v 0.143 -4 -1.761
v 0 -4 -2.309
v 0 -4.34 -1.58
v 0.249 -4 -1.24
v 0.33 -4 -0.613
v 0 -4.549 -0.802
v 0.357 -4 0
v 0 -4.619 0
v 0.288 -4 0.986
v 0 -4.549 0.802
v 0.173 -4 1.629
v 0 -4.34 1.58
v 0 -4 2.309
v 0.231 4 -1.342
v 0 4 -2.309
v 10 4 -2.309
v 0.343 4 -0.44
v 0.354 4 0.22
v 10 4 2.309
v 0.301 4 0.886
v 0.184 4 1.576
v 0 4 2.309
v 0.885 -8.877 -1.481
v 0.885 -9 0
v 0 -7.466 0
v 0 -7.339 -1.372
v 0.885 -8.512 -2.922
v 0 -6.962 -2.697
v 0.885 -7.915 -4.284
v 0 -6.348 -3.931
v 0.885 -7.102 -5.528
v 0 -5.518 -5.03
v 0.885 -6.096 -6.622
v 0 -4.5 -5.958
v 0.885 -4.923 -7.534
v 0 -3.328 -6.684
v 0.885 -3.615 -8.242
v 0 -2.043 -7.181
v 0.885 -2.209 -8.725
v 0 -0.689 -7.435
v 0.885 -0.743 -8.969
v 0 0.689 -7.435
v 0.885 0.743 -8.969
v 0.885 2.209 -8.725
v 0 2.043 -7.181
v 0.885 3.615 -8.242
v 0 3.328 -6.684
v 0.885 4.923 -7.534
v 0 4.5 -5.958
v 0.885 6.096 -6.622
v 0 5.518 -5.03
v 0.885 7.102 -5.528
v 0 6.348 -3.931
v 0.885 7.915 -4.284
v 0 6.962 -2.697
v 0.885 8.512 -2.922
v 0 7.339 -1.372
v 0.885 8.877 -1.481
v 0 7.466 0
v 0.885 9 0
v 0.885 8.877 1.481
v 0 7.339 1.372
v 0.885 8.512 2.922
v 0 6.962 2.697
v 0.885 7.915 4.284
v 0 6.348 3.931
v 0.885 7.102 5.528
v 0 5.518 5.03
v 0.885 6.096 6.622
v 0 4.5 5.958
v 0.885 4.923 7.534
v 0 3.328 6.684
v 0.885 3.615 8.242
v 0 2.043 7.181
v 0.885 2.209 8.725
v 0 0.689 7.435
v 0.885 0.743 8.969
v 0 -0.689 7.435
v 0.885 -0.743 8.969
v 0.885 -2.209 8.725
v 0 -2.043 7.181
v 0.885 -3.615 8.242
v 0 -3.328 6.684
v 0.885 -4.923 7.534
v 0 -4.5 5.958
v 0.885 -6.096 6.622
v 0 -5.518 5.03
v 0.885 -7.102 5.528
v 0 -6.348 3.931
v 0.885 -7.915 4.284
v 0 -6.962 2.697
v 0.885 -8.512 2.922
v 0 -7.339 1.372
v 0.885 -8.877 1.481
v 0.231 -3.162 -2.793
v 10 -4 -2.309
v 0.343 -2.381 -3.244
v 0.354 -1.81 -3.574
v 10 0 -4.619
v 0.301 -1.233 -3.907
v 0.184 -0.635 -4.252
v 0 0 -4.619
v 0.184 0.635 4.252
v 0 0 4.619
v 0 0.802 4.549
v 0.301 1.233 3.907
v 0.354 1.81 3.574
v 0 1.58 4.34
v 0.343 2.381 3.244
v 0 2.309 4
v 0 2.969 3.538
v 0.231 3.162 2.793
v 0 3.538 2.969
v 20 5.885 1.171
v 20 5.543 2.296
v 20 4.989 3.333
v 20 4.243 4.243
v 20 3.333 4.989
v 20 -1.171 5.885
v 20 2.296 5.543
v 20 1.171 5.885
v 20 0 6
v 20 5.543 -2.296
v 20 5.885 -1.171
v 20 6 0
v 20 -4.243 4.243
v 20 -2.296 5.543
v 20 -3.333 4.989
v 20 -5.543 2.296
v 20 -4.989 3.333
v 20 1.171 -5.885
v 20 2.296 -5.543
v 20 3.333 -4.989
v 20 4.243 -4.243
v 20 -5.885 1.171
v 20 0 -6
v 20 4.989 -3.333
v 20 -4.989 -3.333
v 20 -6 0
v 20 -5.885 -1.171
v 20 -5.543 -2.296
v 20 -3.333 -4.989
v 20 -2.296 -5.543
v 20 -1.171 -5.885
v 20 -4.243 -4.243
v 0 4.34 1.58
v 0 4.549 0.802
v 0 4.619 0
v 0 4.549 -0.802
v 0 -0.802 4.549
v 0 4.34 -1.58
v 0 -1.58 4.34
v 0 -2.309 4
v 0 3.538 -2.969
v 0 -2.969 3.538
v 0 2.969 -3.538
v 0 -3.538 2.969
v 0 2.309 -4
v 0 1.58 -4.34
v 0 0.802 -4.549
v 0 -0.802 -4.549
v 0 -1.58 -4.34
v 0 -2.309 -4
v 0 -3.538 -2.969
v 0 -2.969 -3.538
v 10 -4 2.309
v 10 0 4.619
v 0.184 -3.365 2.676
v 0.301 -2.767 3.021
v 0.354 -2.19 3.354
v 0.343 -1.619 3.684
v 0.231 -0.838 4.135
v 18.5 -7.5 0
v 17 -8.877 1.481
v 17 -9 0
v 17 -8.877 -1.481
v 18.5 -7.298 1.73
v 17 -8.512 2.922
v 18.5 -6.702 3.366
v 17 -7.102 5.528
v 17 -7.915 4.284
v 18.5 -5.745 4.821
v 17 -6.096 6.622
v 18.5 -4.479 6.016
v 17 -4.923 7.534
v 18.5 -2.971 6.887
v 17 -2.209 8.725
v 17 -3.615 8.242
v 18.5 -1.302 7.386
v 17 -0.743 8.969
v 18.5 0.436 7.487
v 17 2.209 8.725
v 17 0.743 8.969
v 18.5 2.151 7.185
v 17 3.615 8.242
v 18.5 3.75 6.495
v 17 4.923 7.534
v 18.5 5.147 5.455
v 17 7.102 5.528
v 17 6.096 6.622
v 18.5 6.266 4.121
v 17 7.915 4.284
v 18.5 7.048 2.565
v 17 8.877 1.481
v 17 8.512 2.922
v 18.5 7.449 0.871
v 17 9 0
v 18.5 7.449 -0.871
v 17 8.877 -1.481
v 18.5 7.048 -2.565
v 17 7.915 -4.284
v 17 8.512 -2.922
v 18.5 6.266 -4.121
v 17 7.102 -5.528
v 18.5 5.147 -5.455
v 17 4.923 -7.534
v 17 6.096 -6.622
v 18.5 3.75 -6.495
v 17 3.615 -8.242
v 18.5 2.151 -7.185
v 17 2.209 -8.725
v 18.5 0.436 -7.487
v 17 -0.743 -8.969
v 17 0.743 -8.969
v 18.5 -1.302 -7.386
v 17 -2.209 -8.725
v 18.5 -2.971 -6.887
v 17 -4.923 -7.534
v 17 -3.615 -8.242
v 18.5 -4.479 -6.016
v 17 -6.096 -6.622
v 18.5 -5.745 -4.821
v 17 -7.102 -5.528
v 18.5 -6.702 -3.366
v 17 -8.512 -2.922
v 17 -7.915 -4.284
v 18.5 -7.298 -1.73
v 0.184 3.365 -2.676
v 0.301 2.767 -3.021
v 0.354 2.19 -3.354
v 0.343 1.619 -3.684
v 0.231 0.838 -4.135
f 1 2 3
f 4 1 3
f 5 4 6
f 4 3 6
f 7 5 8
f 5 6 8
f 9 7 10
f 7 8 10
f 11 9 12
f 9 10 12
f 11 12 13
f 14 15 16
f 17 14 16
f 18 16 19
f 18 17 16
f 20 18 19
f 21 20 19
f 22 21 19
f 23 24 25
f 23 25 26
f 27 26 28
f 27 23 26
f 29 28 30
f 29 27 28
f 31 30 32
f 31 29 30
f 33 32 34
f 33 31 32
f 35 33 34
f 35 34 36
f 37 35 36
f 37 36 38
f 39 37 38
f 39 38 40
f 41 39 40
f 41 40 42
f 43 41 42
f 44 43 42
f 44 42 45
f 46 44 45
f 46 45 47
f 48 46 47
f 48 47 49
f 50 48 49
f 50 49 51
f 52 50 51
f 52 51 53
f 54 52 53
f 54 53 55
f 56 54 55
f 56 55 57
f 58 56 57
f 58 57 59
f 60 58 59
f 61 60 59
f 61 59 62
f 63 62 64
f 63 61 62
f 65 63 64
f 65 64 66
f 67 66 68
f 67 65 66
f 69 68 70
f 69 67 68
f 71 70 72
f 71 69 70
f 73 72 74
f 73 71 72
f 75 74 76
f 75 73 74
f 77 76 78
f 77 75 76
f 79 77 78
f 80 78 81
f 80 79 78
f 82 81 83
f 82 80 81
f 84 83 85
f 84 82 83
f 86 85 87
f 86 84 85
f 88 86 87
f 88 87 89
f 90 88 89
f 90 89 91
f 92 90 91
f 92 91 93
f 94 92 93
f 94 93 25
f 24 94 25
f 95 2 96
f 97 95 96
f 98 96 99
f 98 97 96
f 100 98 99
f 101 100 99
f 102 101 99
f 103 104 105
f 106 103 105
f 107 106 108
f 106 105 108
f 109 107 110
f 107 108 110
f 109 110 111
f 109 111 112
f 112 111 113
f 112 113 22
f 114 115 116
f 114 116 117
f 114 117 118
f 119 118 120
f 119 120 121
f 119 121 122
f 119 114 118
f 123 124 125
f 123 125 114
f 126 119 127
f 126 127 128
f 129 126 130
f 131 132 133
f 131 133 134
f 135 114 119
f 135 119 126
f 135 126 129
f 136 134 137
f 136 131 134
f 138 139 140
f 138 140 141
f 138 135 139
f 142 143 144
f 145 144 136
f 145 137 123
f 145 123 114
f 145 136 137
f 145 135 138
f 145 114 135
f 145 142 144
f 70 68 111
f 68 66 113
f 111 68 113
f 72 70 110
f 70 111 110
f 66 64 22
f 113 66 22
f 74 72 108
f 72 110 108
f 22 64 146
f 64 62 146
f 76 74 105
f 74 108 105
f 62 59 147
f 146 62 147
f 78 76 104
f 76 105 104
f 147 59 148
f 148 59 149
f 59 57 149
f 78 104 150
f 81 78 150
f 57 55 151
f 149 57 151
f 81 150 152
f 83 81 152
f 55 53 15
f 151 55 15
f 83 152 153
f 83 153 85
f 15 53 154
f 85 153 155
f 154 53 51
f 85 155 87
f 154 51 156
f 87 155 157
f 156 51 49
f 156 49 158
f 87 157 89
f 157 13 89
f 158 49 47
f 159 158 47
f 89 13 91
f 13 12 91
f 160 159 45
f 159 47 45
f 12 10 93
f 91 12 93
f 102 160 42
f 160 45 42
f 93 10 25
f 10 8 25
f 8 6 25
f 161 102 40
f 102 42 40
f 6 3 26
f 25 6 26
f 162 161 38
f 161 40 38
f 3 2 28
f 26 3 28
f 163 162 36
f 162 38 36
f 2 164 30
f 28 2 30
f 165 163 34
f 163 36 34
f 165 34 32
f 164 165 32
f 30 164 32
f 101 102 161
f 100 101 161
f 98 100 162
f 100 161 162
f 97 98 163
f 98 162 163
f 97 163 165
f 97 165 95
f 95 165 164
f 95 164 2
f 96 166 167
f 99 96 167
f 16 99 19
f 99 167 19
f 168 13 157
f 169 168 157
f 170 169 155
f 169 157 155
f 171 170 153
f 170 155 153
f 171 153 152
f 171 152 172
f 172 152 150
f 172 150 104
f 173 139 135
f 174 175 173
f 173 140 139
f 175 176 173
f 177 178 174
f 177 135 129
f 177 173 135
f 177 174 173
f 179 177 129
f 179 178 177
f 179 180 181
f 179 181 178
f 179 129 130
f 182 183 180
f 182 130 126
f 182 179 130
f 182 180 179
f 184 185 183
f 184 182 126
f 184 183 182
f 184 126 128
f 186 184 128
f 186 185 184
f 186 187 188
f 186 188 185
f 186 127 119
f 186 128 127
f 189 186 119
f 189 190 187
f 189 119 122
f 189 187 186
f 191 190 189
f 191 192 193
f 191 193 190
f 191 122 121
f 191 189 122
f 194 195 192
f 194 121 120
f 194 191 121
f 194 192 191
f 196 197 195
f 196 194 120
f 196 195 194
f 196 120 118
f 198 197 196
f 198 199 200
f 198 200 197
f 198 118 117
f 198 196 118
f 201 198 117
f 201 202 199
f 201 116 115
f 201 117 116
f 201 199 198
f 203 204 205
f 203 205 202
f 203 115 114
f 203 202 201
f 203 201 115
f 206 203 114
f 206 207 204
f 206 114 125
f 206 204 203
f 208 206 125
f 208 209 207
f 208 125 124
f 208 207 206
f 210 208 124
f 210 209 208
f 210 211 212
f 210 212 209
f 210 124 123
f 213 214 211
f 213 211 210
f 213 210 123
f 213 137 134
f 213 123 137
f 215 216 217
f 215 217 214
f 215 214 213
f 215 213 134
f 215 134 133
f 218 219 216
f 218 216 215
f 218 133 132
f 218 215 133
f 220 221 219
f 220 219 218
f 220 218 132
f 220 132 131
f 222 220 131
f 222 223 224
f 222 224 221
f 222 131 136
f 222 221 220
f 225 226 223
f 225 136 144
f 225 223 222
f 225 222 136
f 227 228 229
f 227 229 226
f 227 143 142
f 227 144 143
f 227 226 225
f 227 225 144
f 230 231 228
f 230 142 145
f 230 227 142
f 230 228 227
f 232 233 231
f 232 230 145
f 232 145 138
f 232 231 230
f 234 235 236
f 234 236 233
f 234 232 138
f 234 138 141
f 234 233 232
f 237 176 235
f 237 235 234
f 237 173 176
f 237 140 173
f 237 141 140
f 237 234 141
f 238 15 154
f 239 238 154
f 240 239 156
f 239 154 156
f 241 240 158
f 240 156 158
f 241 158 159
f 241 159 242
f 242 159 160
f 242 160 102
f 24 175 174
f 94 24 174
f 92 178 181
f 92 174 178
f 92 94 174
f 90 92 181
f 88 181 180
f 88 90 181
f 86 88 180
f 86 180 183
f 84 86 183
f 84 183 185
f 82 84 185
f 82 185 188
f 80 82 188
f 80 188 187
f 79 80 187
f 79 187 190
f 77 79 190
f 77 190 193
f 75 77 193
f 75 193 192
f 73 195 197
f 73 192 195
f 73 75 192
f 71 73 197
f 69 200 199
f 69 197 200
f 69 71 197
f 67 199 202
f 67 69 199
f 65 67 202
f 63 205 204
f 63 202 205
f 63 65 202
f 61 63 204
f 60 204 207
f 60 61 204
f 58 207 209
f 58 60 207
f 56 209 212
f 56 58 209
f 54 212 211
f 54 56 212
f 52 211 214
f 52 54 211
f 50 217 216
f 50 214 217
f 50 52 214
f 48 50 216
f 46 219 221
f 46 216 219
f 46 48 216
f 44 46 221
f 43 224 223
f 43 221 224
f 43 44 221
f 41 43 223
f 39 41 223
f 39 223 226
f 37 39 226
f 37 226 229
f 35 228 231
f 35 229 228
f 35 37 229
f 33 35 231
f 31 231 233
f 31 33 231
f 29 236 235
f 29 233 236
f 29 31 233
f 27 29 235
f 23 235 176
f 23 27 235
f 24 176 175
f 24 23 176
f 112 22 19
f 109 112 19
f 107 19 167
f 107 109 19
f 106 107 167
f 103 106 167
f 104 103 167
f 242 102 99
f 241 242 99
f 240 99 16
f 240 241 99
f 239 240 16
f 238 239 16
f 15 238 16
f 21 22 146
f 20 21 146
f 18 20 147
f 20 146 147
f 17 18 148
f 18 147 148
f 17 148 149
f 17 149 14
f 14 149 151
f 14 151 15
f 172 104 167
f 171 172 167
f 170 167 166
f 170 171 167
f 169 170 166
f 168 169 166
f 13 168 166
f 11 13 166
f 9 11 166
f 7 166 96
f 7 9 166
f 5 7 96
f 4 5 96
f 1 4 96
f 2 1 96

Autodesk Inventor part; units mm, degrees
sketch "Sketch_1" plane through (0, 0, 0) normal (0, 0, 1) x (1, 0, 0)
  line L0 (2.6667, 0) -> (20, 0)
  line L1 (20, 0) -> (20, -6)
  line L2 (20, -6) -> (17, -9)
  line L3 (17, -9) -> (0.8854, -9)
  line L4 (0.8854, -9) -> (0, -7.4665)
  line L5 (0, -7.4665) -> (0, -4.6188)
  line L6 (0, -4.6188) -> (2.6667, 0)
  line L7 (2.6667, 0) -> (20, 0)
revolve "Revolution1" add sketch "Sketch_1" angle 360 about axis through (2.6667, 0, 0) along (1, 0, 0)
thread "Thread1" size "M18x2.5" class "6g" standard "ISO Metric profile" full length
sketch "Sketch_2" plane through (0, 0, 0) normal (1, 0, 0) x (0, 1, 0)
  line L0 (0, 4.6188) -> (-4, 2.3094)
  line L1 (-4, 2.3094) -> (-4, -2.3094)
  line L2 (-4, -2.3094) -> (0, -4.6188)
  line L3 (0, -4.6188) -> (4, -2.3094)
  line L4 (4, -2.3094) -> (4, 2.3094)
  line L5 (4, 2.3094) -> (0, 4.6188)
extrude "Extrusion1" cut sketch "Sketch_2" along normal blind 10
ref_plane "IP1_XY" through (0, 0, 0) normal (1, 0, 0) x (0, 0, -1)
ref_plane "IP1_YZ" through (0, 0, 0) normal (0, 0, -1) x (0, 1, 0)
ref_plane "IP1_ZX" through (0, 0, 0) normal (0, 1, 0) x (1, 0, 0)
ref_plane "IP2_XY" through (20, 0, 0) normal (1, 0, 0) x (0, 0, -1)
ref_plane "IP2_YZ" through (20, 0, 0) normal (0, 0, -1) x (0, 1, 0)
ref_plane "IP2_ZX" through (20, 0, 0) normal (0, 1, 0) x (1, 0, 0)
properties part number "DIN-913 - M18x20"
